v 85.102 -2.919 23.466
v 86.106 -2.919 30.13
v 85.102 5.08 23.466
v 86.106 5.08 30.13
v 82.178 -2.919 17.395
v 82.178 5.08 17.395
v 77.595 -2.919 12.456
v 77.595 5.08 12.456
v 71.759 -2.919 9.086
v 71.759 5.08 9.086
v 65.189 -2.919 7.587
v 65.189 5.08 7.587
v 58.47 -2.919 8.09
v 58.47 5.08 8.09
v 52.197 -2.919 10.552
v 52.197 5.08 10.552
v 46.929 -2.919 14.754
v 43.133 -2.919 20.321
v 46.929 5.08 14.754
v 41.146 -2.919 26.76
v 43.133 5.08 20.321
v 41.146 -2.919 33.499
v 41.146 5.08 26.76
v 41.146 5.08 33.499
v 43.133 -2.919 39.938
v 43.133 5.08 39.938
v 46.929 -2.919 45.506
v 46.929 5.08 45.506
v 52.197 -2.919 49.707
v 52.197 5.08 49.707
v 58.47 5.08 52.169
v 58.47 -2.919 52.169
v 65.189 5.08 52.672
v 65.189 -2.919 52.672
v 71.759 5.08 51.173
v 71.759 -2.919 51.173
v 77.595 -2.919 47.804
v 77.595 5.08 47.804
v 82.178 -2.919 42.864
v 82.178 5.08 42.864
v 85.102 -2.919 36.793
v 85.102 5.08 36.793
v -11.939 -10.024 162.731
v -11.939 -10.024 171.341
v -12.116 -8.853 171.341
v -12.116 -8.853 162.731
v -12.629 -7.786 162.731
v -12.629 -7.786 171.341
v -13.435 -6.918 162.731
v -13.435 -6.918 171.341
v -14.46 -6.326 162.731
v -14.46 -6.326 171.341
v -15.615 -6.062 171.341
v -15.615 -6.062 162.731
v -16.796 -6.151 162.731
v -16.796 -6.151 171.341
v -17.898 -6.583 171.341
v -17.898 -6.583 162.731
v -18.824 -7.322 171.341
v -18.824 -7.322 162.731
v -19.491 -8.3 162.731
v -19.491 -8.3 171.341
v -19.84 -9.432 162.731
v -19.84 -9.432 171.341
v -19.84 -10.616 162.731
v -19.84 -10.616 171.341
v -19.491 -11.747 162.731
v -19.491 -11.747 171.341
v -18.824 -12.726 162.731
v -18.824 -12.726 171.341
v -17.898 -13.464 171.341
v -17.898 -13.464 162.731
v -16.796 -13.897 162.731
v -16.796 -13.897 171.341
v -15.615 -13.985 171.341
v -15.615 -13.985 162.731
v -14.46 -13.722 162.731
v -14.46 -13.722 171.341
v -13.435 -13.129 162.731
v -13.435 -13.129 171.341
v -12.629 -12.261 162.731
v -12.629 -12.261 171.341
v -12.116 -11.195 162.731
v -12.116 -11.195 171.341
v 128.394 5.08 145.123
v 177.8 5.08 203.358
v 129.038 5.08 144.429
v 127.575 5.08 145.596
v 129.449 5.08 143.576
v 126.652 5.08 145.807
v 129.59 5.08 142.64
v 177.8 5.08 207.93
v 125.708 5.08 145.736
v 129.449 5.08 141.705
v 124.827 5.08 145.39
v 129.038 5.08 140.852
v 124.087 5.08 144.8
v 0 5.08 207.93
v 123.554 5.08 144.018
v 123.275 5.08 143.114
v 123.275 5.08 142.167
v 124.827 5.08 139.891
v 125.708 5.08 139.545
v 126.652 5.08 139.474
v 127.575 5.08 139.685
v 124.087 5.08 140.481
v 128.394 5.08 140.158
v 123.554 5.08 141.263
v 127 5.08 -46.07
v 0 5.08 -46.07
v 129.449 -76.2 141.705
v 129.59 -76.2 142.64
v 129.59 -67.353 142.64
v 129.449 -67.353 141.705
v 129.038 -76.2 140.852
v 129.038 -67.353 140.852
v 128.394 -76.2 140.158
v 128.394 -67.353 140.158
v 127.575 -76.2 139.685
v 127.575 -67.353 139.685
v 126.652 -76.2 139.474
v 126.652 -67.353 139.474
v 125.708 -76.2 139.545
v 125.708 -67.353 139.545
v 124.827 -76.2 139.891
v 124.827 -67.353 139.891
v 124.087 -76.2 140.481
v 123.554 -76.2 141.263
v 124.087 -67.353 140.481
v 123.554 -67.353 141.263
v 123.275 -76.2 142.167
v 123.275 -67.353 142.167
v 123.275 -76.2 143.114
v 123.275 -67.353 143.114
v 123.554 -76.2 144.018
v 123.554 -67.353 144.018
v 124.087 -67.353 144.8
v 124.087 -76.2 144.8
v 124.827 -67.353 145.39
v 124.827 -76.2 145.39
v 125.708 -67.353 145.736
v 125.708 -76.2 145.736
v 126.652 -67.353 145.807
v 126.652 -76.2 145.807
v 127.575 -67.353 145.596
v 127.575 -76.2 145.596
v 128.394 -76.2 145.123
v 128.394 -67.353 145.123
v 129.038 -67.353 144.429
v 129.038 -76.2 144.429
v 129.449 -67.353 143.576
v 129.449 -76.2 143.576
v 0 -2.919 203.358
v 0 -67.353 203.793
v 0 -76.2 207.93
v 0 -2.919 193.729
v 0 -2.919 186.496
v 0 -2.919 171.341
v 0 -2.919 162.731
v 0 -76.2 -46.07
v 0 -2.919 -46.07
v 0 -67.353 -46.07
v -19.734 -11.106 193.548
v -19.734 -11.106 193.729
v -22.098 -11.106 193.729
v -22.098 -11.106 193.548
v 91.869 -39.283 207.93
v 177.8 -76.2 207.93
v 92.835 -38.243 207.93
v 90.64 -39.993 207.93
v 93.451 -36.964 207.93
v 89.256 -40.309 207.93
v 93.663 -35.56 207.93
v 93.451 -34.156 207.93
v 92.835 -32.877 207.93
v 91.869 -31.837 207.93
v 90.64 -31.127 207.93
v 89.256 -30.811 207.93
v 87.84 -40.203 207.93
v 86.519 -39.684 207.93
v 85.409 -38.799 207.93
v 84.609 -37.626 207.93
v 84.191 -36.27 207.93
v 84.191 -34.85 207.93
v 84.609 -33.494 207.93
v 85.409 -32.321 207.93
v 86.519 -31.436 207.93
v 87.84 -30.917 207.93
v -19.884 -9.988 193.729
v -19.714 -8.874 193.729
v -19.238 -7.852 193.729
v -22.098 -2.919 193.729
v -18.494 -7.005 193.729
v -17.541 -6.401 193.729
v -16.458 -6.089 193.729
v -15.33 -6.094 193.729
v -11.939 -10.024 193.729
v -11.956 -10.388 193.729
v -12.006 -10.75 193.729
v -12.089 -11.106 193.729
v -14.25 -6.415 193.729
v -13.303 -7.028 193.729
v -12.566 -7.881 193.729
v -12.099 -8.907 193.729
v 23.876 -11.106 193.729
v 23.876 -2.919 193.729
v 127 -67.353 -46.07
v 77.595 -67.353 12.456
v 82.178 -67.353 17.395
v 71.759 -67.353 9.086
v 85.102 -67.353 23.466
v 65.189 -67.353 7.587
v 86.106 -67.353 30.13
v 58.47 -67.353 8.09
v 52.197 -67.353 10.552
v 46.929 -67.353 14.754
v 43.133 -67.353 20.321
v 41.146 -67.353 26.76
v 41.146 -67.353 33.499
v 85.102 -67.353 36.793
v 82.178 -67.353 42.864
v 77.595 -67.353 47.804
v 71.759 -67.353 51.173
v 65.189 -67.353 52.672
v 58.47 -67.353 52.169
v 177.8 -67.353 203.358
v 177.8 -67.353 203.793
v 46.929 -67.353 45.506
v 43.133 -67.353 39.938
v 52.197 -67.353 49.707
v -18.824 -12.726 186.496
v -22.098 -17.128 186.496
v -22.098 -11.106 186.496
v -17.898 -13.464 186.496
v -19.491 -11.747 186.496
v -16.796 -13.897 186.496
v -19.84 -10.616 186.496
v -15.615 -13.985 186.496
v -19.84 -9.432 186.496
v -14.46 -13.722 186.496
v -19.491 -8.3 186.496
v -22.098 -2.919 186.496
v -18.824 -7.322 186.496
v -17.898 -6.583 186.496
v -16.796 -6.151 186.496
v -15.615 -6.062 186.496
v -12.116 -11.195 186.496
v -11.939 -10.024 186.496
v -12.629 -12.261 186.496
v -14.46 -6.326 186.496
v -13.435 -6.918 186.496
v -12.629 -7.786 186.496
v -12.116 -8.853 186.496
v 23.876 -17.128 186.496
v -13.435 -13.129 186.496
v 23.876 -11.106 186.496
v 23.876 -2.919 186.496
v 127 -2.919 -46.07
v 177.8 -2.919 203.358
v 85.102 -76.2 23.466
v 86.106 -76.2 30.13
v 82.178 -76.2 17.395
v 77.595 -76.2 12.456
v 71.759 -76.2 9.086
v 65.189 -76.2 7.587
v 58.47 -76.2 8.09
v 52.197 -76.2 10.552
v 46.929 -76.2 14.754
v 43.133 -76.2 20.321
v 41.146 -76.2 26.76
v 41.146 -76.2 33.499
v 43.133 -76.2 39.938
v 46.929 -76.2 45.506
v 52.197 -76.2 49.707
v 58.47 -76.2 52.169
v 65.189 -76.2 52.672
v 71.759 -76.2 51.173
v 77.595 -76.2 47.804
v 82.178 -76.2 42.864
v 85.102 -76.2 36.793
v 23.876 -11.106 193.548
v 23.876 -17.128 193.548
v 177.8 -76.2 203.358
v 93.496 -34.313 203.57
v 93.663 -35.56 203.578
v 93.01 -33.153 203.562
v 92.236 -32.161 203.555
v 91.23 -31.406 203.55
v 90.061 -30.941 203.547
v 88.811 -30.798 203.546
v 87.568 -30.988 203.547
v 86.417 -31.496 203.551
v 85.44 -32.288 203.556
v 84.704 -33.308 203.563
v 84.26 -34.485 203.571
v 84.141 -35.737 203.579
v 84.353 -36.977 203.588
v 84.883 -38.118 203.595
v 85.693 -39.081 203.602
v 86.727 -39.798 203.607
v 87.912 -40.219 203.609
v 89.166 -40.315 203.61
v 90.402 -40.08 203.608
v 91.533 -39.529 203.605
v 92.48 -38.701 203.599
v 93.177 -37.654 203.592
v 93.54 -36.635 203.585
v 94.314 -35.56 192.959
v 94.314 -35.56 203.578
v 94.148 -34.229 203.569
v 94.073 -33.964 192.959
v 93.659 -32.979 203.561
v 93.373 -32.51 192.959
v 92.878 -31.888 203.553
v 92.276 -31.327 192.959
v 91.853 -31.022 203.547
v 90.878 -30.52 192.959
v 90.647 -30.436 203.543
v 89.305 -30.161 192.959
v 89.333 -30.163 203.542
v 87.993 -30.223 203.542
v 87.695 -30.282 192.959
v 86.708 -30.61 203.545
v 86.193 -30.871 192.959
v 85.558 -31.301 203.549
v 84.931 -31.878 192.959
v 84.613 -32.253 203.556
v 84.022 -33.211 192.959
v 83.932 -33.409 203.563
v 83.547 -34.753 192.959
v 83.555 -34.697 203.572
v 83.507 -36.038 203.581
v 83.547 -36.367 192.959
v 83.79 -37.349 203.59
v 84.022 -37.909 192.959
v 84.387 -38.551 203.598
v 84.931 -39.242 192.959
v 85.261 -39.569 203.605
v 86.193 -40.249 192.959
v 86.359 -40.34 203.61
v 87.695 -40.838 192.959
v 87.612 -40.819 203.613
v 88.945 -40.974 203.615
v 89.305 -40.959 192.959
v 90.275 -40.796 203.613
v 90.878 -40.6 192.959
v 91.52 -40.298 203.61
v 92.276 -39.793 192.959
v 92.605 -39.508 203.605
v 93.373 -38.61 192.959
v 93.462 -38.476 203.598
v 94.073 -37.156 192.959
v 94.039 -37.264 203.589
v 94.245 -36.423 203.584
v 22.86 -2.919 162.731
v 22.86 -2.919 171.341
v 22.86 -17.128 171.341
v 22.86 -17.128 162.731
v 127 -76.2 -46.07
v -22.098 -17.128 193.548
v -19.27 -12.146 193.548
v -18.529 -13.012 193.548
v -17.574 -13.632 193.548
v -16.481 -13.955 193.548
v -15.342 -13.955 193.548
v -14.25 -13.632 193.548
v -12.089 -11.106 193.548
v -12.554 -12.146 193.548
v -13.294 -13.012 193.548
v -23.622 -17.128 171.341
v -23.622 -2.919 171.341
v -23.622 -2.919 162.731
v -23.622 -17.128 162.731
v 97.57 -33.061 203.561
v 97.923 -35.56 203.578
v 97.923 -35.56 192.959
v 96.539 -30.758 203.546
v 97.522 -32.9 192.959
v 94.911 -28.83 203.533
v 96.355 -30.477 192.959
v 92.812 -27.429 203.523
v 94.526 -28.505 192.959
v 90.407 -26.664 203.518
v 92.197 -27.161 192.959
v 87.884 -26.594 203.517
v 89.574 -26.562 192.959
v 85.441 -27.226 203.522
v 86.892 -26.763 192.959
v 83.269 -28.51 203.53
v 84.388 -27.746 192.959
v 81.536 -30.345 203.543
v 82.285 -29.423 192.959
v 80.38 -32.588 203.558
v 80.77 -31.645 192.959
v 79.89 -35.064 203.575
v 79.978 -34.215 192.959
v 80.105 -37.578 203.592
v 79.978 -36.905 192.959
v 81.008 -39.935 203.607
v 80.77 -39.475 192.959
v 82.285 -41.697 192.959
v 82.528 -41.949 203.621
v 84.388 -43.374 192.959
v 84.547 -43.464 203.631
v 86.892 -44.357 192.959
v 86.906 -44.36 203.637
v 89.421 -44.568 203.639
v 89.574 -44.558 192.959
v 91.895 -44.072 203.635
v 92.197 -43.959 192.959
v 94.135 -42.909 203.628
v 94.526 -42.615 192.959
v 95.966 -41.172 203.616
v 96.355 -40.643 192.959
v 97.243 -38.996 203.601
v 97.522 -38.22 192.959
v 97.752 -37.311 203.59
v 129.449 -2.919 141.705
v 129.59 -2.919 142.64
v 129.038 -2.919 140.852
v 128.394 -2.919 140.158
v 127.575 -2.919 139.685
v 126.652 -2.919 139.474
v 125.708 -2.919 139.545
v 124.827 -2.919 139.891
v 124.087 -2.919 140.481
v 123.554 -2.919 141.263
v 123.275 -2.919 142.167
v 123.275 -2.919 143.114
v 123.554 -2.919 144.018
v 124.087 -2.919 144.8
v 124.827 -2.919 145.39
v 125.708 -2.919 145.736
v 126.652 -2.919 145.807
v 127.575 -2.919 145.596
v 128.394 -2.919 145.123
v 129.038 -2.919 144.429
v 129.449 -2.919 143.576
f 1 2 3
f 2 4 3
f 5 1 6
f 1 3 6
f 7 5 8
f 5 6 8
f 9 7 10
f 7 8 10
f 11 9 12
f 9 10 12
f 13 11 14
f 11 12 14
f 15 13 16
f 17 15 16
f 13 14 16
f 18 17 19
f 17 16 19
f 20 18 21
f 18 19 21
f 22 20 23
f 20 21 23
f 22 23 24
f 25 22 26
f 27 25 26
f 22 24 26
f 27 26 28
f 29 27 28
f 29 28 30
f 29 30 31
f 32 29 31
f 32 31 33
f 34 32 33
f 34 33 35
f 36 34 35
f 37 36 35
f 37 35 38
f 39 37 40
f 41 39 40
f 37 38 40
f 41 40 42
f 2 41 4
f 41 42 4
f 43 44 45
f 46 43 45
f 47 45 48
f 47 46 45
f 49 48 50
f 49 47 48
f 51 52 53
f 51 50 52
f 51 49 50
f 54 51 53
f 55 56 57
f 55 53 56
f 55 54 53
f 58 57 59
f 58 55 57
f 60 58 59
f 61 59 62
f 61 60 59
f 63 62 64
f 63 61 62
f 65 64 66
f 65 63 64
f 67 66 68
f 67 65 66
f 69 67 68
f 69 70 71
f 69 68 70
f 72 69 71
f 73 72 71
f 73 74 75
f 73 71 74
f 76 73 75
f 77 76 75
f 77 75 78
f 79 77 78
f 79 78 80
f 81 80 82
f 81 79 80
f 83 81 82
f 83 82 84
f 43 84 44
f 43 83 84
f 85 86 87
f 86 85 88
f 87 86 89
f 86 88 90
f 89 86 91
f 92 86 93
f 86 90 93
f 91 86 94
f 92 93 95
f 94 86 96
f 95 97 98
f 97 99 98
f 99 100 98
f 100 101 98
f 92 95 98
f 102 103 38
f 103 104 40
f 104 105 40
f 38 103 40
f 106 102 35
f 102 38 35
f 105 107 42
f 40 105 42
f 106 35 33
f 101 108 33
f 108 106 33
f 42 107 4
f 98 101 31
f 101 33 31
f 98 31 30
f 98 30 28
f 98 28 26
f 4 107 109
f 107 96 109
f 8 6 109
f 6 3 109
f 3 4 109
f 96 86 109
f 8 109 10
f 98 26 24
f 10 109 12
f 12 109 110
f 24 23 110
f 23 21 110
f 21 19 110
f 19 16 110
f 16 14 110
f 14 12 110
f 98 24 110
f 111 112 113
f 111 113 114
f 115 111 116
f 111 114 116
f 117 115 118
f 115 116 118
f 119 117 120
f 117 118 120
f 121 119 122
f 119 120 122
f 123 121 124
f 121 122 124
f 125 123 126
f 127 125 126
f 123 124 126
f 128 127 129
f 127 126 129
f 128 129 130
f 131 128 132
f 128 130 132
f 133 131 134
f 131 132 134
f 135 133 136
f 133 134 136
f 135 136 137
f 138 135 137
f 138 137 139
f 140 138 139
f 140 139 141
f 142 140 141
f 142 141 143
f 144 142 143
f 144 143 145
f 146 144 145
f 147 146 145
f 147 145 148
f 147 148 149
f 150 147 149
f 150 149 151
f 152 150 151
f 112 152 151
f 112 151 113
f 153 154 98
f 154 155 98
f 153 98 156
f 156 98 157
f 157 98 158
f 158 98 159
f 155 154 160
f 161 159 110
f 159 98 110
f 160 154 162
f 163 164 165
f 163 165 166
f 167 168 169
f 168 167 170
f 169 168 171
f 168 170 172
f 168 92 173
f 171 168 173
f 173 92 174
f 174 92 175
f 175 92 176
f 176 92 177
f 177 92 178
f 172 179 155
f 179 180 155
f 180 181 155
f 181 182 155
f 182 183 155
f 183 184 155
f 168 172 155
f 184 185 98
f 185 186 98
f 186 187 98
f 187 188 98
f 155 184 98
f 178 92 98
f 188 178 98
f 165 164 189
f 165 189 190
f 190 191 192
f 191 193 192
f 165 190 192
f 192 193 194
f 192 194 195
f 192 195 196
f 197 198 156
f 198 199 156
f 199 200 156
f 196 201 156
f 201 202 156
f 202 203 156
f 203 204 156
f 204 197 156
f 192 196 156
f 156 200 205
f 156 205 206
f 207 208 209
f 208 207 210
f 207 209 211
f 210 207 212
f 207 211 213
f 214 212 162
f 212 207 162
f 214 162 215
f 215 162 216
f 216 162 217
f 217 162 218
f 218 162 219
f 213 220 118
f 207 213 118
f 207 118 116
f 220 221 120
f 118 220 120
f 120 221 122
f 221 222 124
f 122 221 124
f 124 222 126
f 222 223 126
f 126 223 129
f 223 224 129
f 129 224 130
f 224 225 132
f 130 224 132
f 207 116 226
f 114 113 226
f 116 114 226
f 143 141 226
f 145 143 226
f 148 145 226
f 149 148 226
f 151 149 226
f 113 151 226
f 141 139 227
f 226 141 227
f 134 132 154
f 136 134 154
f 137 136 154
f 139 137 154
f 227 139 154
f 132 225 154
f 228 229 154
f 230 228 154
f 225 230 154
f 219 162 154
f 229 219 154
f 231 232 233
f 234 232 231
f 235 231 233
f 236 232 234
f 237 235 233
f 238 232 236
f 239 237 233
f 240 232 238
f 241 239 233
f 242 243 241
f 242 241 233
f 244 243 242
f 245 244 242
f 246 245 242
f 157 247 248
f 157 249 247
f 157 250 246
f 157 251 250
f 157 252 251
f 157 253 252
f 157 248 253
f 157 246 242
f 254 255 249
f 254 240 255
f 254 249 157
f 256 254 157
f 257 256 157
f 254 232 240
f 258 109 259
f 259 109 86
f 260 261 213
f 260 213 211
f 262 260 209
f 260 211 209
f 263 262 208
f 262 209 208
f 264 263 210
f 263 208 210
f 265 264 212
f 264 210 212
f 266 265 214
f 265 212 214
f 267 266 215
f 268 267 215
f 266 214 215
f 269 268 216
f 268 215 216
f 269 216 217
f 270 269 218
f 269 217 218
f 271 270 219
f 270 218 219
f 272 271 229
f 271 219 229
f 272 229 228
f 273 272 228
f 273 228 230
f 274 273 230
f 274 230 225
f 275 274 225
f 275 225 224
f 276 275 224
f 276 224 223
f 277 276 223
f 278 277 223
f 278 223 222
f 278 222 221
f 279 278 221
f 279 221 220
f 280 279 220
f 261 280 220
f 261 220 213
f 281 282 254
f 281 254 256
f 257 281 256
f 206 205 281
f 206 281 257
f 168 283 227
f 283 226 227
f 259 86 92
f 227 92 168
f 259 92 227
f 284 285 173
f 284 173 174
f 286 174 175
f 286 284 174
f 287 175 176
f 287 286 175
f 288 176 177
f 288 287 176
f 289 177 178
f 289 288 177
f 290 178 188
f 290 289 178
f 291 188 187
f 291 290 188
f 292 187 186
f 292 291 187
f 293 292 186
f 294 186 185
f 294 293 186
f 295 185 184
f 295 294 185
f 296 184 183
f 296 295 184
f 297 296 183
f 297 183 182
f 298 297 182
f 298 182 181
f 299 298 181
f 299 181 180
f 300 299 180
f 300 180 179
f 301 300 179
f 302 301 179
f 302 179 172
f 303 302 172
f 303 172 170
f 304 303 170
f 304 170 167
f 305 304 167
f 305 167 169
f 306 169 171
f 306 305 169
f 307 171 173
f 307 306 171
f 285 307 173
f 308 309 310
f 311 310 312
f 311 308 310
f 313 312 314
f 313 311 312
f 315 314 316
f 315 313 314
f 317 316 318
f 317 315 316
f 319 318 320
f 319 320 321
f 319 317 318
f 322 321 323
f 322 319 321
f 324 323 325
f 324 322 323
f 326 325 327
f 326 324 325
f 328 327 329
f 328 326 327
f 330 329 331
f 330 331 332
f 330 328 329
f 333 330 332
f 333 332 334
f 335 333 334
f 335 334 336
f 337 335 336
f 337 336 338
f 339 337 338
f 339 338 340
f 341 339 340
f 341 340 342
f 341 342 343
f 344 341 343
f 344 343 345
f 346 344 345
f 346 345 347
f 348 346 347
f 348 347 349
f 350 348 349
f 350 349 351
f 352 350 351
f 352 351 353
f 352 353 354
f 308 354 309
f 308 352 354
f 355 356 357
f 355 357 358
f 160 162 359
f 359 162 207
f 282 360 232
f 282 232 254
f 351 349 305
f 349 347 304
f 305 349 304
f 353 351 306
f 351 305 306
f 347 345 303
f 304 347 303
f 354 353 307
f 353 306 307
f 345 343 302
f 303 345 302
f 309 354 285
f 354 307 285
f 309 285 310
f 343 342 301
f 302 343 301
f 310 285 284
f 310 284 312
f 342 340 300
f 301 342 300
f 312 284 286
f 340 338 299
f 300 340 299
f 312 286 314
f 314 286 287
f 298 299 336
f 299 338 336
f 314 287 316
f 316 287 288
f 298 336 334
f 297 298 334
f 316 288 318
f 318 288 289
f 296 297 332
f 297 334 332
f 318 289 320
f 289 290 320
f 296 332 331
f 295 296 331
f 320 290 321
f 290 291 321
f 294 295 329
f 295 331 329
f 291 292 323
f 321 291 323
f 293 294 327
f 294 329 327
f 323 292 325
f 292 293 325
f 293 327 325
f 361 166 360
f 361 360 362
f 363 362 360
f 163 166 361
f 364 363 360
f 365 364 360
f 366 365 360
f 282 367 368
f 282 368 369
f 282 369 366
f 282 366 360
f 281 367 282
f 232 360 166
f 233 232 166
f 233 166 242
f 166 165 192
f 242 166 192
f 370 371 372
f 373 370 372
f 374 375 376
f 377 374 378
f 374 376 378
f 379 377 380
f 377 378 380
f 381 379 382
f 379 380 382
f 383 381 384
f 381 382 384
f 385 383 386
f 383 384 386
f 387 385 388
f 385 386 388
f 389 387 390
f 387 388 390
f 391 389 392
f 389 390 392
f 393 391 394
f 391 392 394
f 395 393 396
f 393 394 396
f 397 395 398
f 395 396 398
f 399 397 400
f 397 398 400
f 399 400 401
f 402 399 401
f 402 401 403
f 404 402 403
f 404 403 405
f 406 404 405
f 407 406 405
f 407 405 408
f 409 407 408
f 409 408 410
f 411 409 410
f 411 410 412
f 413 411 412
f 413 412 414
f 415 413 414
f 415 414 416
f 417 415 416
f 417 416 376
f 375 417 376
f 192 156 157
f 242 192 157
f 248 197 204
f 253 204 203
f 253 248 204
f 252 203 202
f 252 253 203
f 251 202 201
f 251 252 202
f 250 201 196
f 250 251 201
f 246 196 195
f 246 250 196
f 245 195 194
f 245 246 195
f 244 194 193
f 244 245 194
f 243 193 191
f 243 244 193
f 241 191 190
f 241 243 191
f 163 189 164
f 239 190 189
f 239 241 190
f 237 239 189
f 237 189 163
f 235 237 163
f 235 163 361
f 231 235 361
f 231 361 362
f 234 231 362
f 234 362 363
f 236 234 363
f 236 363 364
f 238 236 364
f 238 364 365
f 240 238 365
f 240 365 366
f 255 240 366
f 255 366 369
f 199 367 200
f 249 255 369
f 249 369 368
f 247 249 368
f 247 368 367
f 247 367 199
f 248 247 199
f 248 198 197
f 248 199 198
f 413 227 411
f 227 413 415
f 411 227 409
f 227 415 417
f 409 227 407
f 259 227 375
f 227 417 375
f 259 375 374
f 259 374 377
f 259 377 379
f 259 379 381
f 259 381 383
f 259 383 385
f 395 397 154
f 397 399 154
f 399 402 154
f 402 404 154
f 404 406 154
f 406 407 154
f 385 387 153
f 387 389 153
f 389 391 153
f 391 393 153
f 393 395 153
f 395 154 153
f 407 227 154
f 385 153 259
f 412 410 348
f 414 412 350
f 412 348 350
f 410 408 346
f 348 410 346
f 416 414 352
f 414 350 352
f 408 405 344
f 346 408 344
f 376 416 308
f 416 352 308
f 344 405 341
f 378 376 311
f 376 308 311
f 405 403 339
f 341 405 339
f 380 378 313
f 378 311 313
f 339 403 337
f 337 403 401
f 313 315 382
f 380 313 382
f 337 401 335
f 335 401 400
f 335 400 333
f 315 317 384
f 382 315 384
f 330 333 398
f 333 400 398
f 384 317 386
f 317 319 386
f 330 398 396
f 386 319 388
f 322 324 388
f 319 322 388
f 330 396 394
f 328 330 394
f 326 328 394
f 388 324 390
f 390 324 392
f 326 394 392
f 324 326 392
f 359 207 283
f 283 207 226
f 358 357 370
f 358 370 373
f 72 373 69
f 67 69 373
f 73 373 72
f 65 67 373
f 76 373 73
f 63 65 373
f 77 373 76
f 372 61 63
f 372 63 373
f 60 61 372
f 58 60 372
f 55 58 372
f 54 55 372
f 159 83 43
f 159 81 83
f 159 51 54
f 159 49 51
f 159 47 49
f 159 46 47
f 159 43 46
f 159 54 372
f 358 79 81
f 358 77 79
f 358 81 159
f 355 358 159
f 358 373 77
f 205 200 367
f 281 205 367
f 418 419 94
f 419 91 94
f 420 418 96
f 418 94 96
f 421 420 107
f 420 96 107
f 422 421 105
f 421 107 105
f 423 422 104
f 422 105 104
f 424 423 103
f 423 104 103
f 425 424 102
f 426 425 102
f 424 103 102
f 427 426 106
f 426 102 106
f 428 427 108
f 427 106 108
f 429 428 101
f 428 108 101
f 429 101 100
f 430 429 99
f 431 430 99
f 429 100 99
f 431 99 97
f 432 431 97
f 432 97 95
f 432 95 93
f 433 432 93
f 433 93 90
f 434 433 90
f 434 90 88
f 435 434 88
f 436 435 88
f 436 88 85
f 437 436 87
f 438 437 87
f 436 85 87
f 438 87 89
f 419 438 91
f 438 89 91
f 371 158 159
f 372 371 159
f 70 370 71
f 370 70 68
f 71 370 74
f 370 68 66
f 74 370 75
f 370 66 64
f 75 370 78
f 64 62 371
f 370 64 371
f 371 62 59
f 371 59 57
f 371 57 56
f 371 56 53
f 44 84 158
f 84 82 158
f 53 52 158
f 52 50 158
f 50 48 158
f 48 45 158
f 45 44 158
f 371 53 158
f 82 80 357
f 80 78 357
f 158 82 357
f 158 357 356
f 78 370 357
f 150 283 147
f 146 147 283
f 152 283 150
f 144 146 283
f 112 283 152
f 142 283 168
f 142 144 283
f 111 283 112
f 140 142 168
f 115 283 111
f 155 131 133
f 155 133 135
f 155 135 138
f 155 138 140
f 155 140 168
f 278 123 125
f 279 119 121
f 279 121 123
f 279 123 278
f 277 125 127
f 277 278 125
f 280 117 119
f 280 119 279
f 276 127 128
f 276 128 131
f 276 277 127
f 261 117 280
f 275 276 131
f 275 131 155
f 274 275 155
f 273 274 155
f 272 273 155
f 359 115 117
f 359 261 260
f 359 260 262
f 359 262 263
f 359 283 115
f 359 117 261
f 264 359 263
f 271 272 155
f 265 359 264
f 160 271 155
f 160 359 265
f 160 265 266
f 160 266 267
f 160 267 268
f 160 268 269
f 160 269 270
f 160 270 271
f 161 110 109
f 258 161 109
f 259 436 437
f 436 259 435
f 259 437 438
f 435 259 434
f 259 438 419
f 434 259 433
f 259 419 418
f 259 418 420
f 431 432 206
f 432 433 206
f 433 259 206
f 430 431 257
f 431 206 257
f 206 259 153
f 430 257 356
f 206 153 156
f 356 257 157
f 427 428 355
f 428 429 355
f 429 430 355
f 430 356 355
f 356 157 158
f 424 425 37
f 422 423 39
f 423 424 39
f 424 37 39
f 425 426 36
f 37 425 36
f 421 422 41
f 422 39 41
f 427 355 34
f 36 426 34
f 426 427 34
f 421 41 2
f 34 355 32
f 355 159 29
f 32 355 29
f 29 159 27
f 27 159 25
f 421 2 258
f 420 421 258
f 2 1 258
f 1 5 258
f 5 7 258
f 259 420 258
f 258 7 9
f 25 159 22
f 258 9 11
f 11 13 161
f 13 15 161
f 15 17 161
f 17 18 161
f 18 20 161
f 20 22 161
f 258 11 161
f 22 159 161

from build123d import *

# Parameters (mm, degrees)
SALIENTE_EXTRUIR1_DEPTH       = 4.572
CROQUIS2_W                    = 4.572
CROQUIS2_H                    = 76.2
SALIENTE_EXTRUIR2_DEPTH       = 177.8
SALIENTE_EXTRUIR3_DEPTH       = 5.08
SALIENTE_EXTRUIR3_DEPTH_BACK  = 76.2
CORTAR_EXTRUIR5_DEPTH         = 208.534
CROQUIS5_R                    = 12.7
CORTAR_EXTRUIR6_DEPTH         = 50.038
CORTAR_EXTRUIR6_DEPTH_BACK    = 148.336
CROQUIS6_R                    = 22.606
CORTAR_EXTRUIR12_DEPTH        = 33.274
CORTAR_EXTRUIR12_DEPTH_BACK   = 97.282
CROQUIS7_R                    = 7.975525782
CORTAR_EXTRUIR13_DEPTH        = 66.04
CORTAR_EXTRUIR13_DEPTH_BACK   = 177.8
CROQUIS8_R                    = 8.001
CROQUIS8_R_2                  = 7.975525782
SALIENTE_EXTRUIR8_DEPTH       = 19.304
SALIENTE_EXTRUIR8_DEPTH_BACK  = 18.034
CROQUIS9_R                    = 8.001
SALIENTE_EXTRUIR9_DEPTH       = 15.494
SALIENTE_EXTRUIR9_DEPTH_BACK  = 19.558
CROQUIS10_W                   = 16.002
CROQUIS10_H                   = 15.494
CORTAR_EXTRUIR14_DEPTH        = 261.874
CORTAR_EXTRUIR15_DEPTH        = 422.402
CROQUIS12_R                   = 8.001
SALIENTE_EXTRUIR10_DEPTH      = 118.618
CROQUIS13_W                   = 16.002
CROQUIS13_H                   = 64.433284084
CORTAR_EXTRUIR16_DEPTH        = 300.99
CORTAR_EXTRUIR17_DEPTH        = 262.89
CROQUIS15_R                   = 3.175
CORTAR_EXTRUIR18_DEPTH        = 120.142
CORTAR_EXTRUIR18_DEPTH_BACK   = 292.1
CROQUIS16_R                   = 4.7625
CORTAR_EXTRUIR20_DEPTH        = 446.532
CROQUIS20_R                   = 9.023236634
CROQUIS20_R_2                 = 5.413941981
SALIENTE_EXTRUIR12_DEPTH      = 206.502
SALIENTE_EXTRUIR12_DEPTH_BACK = 2.54
CROQUIS22_W                   = 184.818676859
CROQUIS22_H                   = 18.046473268
CORTAR_EXTRUIR21_DEPTH        = 252.984
CROQUIS23_W                   = 10.680092276
CROQUIS23_H                   = 18.046473268
CORTAR_EXTRUIR22_DEPTH        = 336.55
CROQUIS24_W                   = 7.23294038
CROQUIS24_H                   = 8.186318229
SALIENTE_EXTRUIR13_DEPTH      = 23.876
SALIENTE_EXTRUIR13_DEPTH_BACK = 22.098
CROQUIS25_W                   = 45.974
CROQUIS25_H                   = 6.021939504
SALIENTE_EXTRUIR14_DEPTH      = 193.548
SALIENTE_EXTRUIR14_DEPTH_BACK = 5.08
CROQUIS26_W                   = 191.576169951
CROQUIS26_H                   = 6.021939504
CORTAR_EXTRUIR23_DEPTH        = 184.658
CORTAR_EXTRUIR23_DEPTH_BACK   = 81.534
CROQUIS27_W                   = 8.610643309
CROQUIS27_H                   = 14.208257733
SALIENTE_EXTRUIR15_DEPTH      = 22.86
SALIENTE_EXTRUIR15_DEPTH_BACK = 23.622
CROQUIS28_R                   = 3.97256
CORTAR_EXTRUIR24_DEPTH        = 207.01


with BuildPart() as part:
    # Croquis1 → Saliente-Extruir1 (new body)
    with BuildSketch(Plane(origin=(0, 0, 0), x_dir=(1, 0, 0), z_dir=(0, 1, 0))):
        Polygon((0, 46.07031702), (0, -207.92968298), (177.8, -207.92968298), (127, 46.07031702), align=None)
    extrude(amount=SALIENTE_EXTRUIR1_DEPTH)

    # Croquis2 → Saliente-Extruir2 (add)
    with BuildSketch(Plane(origin=(0, 0, 0), x_dir=(0, 0, -1), z_dir=(1, 0, 0))):
        with Locations((-205.64368298, -33.528)):
            Rectangle(CROQUIS2_W, CROQUIS2_H)
    extrude(amount=SALIENTE_EXTRUIR2_DEPTH)

    # Croquis3 → Saliente-Extruir3 (add, two sides)
    with BuildSketch(Plane(origin=(0, 0, 0), x_dir=(1, 0, 0), z_dir=(0, 1, 0))) as saliente_extruir3_sk:
        Polygon((0, -207.92968298), (0, 46.07031702), (127, 46.07031702), (177.8, -203.35768298), (177.8, -207.92968298), align=None)
    extrude(amount=SALIENTE_EXTRUIR3_DEPTH)
    extrude(saliente_extruir3_sk.sketch, amount=-SALIENTE_EXTRUIR3_DEPTH_BACK)

    # Croquis4 → Cortar-Extruir5 (cut)
    with BuildSketch(Plane(origin=(0, 0, 0), x_dir=(0, 0, -1), z_dir=(1, 0, 0))):
        Polygon((46.07031702, -2.919454773), (46.07031702, -67.352738857), (-203.792527081, -67.352738857), (-203.35768298, -2.919454773), align=None)
    extrude(amount=CORTAR_EXTRUIR5_DEPTH, mode=Mode.SUBTRACT)

    # Croquis5 → Cortar-Extruir6 (cut, two sides)
    with BuildSketch(Plane(origin=(0, 0, 0), x_dir=(1, 0, 0), z_dir=(0, 1, 0))) as cortar_extruir6_sk:
        with Locations((63.5, -30.12968298)):
            Circle(CROQUIS5_R)
    extrude(amount=CORTAR_EXTRUIR6_DEPTH, mode=Mode.SUBTRACT)
    extrude(cortar_extruir6_sk.sketch, amount=-CORTAR_EXTRUIR6_DEPTH_BACK, mode=Mode.SUBTRACT)

    # Croquis6 → Cortar-Extruir12 (cut, two sides)
    with BuildSketch(Plane(origin=(0, 0, 0), x_dir=(1, 0, 0), z_dir=(0, 1, 0))) as cortar_extruir12_sk:
        with Locations((63.5, -30.12968298)):
            Circle(CROQUIS6_R)
    extrude(amount=CORTAR_EXTRUIR12_DEPTH, mode=Mode.SUBTRACT)
    extrude(cortar_extruir12_sk.sketch, amount=-CORTAR_EXTRUIR12_DEPTH_BACK, mode=Mode.SUBTRACT)

    # Croquis7 → Cortar-Extruir13 (cut, two sides)
    with BuildSketch(Plane(origin=(0, 0, 0), x_dir=(1, 0, 0), z_dir=(0, 1, 0))) as cortar_extruir13_sk:
        with Locations((122.352899809, -133.656770096)):
            Circle(CROQUIS7_R)
    extrude(amount=CORTAR_EXTRUIR13_DEPTH, mode=Mode.SUBTRACT)
    extrude(cortar_extruir13_sk.sketch, amount=-CORTAR_EXTRUIR13_DEPTH_BACK, mode=Mode.SUBTRACT)

    # Croquis8 → Saliente-Extruir8 (add, two sides)
    with BuildSketch(Plane.XZ.offset(76.2)) as saliente_extruir8_sk:
        with Locations((122.352899809, 133.656770096)):
            Circle(CROQUIS8_R)
        with Locations((122.352899809, 133.656770096)):
            Circle(CROQUIS8_R_2, mode=Mode.SUBTRACT)
    extrude(amount=SALIENTE_EXTRUIR8_DEPTH)
    extrude(saliente_extruir8_sk.sketch, amount=-SALIENTE_EXTRUIR8_DEPTH_BACK)

    # Croquis9 → Saliente-Extruir9 (add, two sides)
    with BuildSketch(Plane(origin=(0, 5.08, 0), x_dir=(1, 0, 0), z_dir=(0, 1, 0))) as saliente_extruir9_sk:
        with Locations((122.352899809, -133.656770096)):
            Circle(CROQUIS9_R)
    extrude(amount=SALIENTE_EXTRUIR9_DEPTH)
    extrude(saliente_extruir9_sk.sketch, amount=-SALIENTE_EXTRUIR9_DEPTH_BACK)

    # Croquis10 → Cortar-Extruir14 (cut)
    with BuildSketch(Plane(origin=(0, 0, 0), x_dir=(0, 0, -1), z_dir=(1, 0, 0))):
        with Locations((-133.656770096, 12.827)):
            Rectangle(CROQUIS10_W, CROQUIS10_H)
    extrude(amount=CORTAR_EXTRUIR14_DEPTH, mode=Mode.SUBTRACT)

    # Croquis11 → Cortar-Extruir15 (cut)
    with BuildSketch(Plane(origin=(0, 0, 0), x_dir=(0, 0, -1), z_dir=(1, 0, 0))):
        Polygon((-142.139346511, -2.919454773), (-142.052853493, -14.491925991), (-125.655770096, -14.478), (-125.655770096, -2.919454773), align=None)
        Polygon((-141.657770096, -67.352738857), (-125.655770096, -67.352738857), (-125.655770096, -57.997233167), (-141.727693443, -57.997233167), align=None)
    extrude(amount=CORTAR_EXTRUIR15_DEPTH, mode=Mode.SUBTRACT)

    # Croquis12 → Saliente-Extruir10 (add)
    with BuildSketch(Plane(origin=(0, 0, 0), x_dir=(1, 0, 0), z_dir=(0, 1, 0))):
        with Locations((122.352899809, -133.656770096)):
            Circle(CROQUIS12_R)
    extrude(amount=-SALIENTE_EXTRUIR10_DEPTH)

    # Croquis13 → Cortar-Extruir16 (cut)
    with BuildSketch(Plane(origin=(0, 0, 0), x_dir=(0, 0, -1), z_dir=(1, 0, 0))):
        with Locations((-133.656770096, -35.136096815)):
            Rectangle(CROQUIS13_W, CROQUIS13_H)
    extrude(amount=CORTAR_EXTRUIR16_DEPTH, mode=Mode.SUBTRACT)

    # Croquis14 → Cortar-Extruir17 (cut)
    with BuildSketch(Plane(origin=(0, 0, 0), x_dir=(0, 0, -1), z_dir=(1, 0, 0))):
        Polygon((-141.823129416, -76.2), (-141.657770096, -118.618), (-125.655770096, -118.618), (-125.655770096, -76.2), align=None)
    extrude(amount=CORTAR_EXTRUIR17_DEPTH, mode=Mode.SUBTRACT)

    # Croquis15 → Cortar-Extruir18 (cut, two sides)
    with BuildSketch(Plane(origin=(0, 0, 0), x_dir=(1, 0, 0), z_dir=(0, 1, 0))) as cortar_extruir18_sk:
        with Locations((126.414802626, -142.640423395)):
            Circle(CROQUIS15_R)
    extrude(amount=CORTAR_EXTRUIR18_DEPTH, mode=Mode.SUBTRACT)
    extrude(cortar_extruir18_sk.sketch, amount=-CORTAR_EXTRUIR18_DEPTH_BACK, mode=Mode.SUBTRACT)

    # Croquis16 → Cortar-Extruir20 (cut)
    with BuildSketch(Plane.XY):
        with Locations((88.9, -35.56)):
            Circle(CROQUIS16_R)
    extrude(amount=CORTAR_EXTRUIR20_DEPTH, mode=Mode.SUBTRACT)

    # Croquis20 → Saliente-Extruir12 (add, two sides)
    with BuildSketch(Plane.XY) as saliente_extruir12_sk:
        with Locations((88.9, -35.56)):
            Circle(CROQUIS20_R)
        with Locations((88.9, -35.56)):
            Circle(CROQUIS20_R_2, mode=Mode.SUBTRACT)
    extrude(amount=SALIENTE_EXTRUIR12_DEPTH)
    extrude(saliente_extruir12_sk.sketch, amount=-SALIENTE_EXTRUIR12_DEPTH_BACK)

    # Croquis22 → Cortar-Extruir21 (cut)
    with BuildSketch(Plane(origin=(0, 0, 0), x_dir=(0, 0, -1), z_dir=(1, 0, 0))):
        with Locations((-89.86933843, -35.56)):
            Rectangle(CROQUIS22_W, CROQUIS22_H)
    extrude(amount=CORTAR_EXTRUIR21_DEPTH, mode=Mode.SUBTRACT)

    # Croquis23 → Cortar-Extruir22 (cut)
    with BuildSketch(Plane(origin=(0, 0, 0), x_dir=(0, 0, -1), z_dir=(1, 0, 0))):
        with Locations((-187.618722997, -35.56)):
            Rectangle(CROQUIS23_W, CROQUIS23_H)
    extrude(amount=CORTAR_EXTRUIR22_DEPTH, mode=Mode.SUBTRACT)

    # Croquis24 → Saliente-Extruir13 (add, two sides)
    with BuildSketch(Plane(origin=(0, 0, 0), x_dir=(0, 0, -1), z_dir=(1, 0, 0))) as saliente_extruir13_sk:
        with Locations((-190.112640141, -7.012613888)):
            Rectangle(CROQUIS24_W, CROQUIS24_H)
    extrude(amount=SALIENTE_EXTRUIR13_DEPTH)
    extrude(saliente_extruir13_sk.sketch, amount=-SALIENTE_EXTRUIR13_DEPTH_BACK)

    # Croquis25 → Saliente-Extruir14 (add, two sides)
    with BuildSketch(Plane.XY) as saliente_extruir14_sk:
        with Locations((0.889, -14.116742754)):
            Rectangle(CROQUIS25_W, CROQUIS25_H)
    extrude(amount=SALIENTE_EXTRUIR14_DEPTH)
    extrude(saliente_extruir14_sk.sketch, amount=-SALIENTE_EXTRUIR14_DEPTH_BACK)

    # Croquis26 → Cortar-Extruir23 (cut, two sides)
    with BuildSketch(Plane(origin=(0, 0, 0), x_dir=(0, 0, -1), z_dir=(1, 0, 0))) as cortar_extruir23_sk:
        with Locations((-90.708084976, -14.116742754)):
            Rectangle(CROQUIS26_W, CROQUIS26_H)
    extrude(amount=CORTAR_EXTRUIR23_DEPTH, mode=Mode.SUBTRACT)
    extrude(cortar_extruir23_sk.sketch, amount=-CORTAR_EXTRUIR23_DEPTH_BACK, mode=Mode.SUBTRACT)

    # Croquis27 → Saliente-Extruir15 (add, two sides)
    with BuildSketch(Plane(origin=(0, 0, 0), x_dir=(0, 0, -1), z_dir=(1, 0, 0))) as saliente_extruir15_sk:
        with Locations((-167.036116073, -10.023583639)):
            Rectangle(CROQUIS27_W, CROQUIS27_H)
    extrude(amount=SALIENTE_EXTRUIR15_DEPTH)
    extrude(saliente_extruir15_sk.sketch, amount=-SALIENTE_EXTRUIR15_DEPTH_BACK)

    # Croquis28 → Cortar-Extruir24 (cut)
    with BuildSketch(Plane.XY):
        with Locations((-15.911630765, -10.02358364)):
            Circle(CROQUIS28_R)
    extrude(amount=CORTAR_EXTRUIR24_DEPTH, mode=Mode.SUBTRACT)


solid = part.part
